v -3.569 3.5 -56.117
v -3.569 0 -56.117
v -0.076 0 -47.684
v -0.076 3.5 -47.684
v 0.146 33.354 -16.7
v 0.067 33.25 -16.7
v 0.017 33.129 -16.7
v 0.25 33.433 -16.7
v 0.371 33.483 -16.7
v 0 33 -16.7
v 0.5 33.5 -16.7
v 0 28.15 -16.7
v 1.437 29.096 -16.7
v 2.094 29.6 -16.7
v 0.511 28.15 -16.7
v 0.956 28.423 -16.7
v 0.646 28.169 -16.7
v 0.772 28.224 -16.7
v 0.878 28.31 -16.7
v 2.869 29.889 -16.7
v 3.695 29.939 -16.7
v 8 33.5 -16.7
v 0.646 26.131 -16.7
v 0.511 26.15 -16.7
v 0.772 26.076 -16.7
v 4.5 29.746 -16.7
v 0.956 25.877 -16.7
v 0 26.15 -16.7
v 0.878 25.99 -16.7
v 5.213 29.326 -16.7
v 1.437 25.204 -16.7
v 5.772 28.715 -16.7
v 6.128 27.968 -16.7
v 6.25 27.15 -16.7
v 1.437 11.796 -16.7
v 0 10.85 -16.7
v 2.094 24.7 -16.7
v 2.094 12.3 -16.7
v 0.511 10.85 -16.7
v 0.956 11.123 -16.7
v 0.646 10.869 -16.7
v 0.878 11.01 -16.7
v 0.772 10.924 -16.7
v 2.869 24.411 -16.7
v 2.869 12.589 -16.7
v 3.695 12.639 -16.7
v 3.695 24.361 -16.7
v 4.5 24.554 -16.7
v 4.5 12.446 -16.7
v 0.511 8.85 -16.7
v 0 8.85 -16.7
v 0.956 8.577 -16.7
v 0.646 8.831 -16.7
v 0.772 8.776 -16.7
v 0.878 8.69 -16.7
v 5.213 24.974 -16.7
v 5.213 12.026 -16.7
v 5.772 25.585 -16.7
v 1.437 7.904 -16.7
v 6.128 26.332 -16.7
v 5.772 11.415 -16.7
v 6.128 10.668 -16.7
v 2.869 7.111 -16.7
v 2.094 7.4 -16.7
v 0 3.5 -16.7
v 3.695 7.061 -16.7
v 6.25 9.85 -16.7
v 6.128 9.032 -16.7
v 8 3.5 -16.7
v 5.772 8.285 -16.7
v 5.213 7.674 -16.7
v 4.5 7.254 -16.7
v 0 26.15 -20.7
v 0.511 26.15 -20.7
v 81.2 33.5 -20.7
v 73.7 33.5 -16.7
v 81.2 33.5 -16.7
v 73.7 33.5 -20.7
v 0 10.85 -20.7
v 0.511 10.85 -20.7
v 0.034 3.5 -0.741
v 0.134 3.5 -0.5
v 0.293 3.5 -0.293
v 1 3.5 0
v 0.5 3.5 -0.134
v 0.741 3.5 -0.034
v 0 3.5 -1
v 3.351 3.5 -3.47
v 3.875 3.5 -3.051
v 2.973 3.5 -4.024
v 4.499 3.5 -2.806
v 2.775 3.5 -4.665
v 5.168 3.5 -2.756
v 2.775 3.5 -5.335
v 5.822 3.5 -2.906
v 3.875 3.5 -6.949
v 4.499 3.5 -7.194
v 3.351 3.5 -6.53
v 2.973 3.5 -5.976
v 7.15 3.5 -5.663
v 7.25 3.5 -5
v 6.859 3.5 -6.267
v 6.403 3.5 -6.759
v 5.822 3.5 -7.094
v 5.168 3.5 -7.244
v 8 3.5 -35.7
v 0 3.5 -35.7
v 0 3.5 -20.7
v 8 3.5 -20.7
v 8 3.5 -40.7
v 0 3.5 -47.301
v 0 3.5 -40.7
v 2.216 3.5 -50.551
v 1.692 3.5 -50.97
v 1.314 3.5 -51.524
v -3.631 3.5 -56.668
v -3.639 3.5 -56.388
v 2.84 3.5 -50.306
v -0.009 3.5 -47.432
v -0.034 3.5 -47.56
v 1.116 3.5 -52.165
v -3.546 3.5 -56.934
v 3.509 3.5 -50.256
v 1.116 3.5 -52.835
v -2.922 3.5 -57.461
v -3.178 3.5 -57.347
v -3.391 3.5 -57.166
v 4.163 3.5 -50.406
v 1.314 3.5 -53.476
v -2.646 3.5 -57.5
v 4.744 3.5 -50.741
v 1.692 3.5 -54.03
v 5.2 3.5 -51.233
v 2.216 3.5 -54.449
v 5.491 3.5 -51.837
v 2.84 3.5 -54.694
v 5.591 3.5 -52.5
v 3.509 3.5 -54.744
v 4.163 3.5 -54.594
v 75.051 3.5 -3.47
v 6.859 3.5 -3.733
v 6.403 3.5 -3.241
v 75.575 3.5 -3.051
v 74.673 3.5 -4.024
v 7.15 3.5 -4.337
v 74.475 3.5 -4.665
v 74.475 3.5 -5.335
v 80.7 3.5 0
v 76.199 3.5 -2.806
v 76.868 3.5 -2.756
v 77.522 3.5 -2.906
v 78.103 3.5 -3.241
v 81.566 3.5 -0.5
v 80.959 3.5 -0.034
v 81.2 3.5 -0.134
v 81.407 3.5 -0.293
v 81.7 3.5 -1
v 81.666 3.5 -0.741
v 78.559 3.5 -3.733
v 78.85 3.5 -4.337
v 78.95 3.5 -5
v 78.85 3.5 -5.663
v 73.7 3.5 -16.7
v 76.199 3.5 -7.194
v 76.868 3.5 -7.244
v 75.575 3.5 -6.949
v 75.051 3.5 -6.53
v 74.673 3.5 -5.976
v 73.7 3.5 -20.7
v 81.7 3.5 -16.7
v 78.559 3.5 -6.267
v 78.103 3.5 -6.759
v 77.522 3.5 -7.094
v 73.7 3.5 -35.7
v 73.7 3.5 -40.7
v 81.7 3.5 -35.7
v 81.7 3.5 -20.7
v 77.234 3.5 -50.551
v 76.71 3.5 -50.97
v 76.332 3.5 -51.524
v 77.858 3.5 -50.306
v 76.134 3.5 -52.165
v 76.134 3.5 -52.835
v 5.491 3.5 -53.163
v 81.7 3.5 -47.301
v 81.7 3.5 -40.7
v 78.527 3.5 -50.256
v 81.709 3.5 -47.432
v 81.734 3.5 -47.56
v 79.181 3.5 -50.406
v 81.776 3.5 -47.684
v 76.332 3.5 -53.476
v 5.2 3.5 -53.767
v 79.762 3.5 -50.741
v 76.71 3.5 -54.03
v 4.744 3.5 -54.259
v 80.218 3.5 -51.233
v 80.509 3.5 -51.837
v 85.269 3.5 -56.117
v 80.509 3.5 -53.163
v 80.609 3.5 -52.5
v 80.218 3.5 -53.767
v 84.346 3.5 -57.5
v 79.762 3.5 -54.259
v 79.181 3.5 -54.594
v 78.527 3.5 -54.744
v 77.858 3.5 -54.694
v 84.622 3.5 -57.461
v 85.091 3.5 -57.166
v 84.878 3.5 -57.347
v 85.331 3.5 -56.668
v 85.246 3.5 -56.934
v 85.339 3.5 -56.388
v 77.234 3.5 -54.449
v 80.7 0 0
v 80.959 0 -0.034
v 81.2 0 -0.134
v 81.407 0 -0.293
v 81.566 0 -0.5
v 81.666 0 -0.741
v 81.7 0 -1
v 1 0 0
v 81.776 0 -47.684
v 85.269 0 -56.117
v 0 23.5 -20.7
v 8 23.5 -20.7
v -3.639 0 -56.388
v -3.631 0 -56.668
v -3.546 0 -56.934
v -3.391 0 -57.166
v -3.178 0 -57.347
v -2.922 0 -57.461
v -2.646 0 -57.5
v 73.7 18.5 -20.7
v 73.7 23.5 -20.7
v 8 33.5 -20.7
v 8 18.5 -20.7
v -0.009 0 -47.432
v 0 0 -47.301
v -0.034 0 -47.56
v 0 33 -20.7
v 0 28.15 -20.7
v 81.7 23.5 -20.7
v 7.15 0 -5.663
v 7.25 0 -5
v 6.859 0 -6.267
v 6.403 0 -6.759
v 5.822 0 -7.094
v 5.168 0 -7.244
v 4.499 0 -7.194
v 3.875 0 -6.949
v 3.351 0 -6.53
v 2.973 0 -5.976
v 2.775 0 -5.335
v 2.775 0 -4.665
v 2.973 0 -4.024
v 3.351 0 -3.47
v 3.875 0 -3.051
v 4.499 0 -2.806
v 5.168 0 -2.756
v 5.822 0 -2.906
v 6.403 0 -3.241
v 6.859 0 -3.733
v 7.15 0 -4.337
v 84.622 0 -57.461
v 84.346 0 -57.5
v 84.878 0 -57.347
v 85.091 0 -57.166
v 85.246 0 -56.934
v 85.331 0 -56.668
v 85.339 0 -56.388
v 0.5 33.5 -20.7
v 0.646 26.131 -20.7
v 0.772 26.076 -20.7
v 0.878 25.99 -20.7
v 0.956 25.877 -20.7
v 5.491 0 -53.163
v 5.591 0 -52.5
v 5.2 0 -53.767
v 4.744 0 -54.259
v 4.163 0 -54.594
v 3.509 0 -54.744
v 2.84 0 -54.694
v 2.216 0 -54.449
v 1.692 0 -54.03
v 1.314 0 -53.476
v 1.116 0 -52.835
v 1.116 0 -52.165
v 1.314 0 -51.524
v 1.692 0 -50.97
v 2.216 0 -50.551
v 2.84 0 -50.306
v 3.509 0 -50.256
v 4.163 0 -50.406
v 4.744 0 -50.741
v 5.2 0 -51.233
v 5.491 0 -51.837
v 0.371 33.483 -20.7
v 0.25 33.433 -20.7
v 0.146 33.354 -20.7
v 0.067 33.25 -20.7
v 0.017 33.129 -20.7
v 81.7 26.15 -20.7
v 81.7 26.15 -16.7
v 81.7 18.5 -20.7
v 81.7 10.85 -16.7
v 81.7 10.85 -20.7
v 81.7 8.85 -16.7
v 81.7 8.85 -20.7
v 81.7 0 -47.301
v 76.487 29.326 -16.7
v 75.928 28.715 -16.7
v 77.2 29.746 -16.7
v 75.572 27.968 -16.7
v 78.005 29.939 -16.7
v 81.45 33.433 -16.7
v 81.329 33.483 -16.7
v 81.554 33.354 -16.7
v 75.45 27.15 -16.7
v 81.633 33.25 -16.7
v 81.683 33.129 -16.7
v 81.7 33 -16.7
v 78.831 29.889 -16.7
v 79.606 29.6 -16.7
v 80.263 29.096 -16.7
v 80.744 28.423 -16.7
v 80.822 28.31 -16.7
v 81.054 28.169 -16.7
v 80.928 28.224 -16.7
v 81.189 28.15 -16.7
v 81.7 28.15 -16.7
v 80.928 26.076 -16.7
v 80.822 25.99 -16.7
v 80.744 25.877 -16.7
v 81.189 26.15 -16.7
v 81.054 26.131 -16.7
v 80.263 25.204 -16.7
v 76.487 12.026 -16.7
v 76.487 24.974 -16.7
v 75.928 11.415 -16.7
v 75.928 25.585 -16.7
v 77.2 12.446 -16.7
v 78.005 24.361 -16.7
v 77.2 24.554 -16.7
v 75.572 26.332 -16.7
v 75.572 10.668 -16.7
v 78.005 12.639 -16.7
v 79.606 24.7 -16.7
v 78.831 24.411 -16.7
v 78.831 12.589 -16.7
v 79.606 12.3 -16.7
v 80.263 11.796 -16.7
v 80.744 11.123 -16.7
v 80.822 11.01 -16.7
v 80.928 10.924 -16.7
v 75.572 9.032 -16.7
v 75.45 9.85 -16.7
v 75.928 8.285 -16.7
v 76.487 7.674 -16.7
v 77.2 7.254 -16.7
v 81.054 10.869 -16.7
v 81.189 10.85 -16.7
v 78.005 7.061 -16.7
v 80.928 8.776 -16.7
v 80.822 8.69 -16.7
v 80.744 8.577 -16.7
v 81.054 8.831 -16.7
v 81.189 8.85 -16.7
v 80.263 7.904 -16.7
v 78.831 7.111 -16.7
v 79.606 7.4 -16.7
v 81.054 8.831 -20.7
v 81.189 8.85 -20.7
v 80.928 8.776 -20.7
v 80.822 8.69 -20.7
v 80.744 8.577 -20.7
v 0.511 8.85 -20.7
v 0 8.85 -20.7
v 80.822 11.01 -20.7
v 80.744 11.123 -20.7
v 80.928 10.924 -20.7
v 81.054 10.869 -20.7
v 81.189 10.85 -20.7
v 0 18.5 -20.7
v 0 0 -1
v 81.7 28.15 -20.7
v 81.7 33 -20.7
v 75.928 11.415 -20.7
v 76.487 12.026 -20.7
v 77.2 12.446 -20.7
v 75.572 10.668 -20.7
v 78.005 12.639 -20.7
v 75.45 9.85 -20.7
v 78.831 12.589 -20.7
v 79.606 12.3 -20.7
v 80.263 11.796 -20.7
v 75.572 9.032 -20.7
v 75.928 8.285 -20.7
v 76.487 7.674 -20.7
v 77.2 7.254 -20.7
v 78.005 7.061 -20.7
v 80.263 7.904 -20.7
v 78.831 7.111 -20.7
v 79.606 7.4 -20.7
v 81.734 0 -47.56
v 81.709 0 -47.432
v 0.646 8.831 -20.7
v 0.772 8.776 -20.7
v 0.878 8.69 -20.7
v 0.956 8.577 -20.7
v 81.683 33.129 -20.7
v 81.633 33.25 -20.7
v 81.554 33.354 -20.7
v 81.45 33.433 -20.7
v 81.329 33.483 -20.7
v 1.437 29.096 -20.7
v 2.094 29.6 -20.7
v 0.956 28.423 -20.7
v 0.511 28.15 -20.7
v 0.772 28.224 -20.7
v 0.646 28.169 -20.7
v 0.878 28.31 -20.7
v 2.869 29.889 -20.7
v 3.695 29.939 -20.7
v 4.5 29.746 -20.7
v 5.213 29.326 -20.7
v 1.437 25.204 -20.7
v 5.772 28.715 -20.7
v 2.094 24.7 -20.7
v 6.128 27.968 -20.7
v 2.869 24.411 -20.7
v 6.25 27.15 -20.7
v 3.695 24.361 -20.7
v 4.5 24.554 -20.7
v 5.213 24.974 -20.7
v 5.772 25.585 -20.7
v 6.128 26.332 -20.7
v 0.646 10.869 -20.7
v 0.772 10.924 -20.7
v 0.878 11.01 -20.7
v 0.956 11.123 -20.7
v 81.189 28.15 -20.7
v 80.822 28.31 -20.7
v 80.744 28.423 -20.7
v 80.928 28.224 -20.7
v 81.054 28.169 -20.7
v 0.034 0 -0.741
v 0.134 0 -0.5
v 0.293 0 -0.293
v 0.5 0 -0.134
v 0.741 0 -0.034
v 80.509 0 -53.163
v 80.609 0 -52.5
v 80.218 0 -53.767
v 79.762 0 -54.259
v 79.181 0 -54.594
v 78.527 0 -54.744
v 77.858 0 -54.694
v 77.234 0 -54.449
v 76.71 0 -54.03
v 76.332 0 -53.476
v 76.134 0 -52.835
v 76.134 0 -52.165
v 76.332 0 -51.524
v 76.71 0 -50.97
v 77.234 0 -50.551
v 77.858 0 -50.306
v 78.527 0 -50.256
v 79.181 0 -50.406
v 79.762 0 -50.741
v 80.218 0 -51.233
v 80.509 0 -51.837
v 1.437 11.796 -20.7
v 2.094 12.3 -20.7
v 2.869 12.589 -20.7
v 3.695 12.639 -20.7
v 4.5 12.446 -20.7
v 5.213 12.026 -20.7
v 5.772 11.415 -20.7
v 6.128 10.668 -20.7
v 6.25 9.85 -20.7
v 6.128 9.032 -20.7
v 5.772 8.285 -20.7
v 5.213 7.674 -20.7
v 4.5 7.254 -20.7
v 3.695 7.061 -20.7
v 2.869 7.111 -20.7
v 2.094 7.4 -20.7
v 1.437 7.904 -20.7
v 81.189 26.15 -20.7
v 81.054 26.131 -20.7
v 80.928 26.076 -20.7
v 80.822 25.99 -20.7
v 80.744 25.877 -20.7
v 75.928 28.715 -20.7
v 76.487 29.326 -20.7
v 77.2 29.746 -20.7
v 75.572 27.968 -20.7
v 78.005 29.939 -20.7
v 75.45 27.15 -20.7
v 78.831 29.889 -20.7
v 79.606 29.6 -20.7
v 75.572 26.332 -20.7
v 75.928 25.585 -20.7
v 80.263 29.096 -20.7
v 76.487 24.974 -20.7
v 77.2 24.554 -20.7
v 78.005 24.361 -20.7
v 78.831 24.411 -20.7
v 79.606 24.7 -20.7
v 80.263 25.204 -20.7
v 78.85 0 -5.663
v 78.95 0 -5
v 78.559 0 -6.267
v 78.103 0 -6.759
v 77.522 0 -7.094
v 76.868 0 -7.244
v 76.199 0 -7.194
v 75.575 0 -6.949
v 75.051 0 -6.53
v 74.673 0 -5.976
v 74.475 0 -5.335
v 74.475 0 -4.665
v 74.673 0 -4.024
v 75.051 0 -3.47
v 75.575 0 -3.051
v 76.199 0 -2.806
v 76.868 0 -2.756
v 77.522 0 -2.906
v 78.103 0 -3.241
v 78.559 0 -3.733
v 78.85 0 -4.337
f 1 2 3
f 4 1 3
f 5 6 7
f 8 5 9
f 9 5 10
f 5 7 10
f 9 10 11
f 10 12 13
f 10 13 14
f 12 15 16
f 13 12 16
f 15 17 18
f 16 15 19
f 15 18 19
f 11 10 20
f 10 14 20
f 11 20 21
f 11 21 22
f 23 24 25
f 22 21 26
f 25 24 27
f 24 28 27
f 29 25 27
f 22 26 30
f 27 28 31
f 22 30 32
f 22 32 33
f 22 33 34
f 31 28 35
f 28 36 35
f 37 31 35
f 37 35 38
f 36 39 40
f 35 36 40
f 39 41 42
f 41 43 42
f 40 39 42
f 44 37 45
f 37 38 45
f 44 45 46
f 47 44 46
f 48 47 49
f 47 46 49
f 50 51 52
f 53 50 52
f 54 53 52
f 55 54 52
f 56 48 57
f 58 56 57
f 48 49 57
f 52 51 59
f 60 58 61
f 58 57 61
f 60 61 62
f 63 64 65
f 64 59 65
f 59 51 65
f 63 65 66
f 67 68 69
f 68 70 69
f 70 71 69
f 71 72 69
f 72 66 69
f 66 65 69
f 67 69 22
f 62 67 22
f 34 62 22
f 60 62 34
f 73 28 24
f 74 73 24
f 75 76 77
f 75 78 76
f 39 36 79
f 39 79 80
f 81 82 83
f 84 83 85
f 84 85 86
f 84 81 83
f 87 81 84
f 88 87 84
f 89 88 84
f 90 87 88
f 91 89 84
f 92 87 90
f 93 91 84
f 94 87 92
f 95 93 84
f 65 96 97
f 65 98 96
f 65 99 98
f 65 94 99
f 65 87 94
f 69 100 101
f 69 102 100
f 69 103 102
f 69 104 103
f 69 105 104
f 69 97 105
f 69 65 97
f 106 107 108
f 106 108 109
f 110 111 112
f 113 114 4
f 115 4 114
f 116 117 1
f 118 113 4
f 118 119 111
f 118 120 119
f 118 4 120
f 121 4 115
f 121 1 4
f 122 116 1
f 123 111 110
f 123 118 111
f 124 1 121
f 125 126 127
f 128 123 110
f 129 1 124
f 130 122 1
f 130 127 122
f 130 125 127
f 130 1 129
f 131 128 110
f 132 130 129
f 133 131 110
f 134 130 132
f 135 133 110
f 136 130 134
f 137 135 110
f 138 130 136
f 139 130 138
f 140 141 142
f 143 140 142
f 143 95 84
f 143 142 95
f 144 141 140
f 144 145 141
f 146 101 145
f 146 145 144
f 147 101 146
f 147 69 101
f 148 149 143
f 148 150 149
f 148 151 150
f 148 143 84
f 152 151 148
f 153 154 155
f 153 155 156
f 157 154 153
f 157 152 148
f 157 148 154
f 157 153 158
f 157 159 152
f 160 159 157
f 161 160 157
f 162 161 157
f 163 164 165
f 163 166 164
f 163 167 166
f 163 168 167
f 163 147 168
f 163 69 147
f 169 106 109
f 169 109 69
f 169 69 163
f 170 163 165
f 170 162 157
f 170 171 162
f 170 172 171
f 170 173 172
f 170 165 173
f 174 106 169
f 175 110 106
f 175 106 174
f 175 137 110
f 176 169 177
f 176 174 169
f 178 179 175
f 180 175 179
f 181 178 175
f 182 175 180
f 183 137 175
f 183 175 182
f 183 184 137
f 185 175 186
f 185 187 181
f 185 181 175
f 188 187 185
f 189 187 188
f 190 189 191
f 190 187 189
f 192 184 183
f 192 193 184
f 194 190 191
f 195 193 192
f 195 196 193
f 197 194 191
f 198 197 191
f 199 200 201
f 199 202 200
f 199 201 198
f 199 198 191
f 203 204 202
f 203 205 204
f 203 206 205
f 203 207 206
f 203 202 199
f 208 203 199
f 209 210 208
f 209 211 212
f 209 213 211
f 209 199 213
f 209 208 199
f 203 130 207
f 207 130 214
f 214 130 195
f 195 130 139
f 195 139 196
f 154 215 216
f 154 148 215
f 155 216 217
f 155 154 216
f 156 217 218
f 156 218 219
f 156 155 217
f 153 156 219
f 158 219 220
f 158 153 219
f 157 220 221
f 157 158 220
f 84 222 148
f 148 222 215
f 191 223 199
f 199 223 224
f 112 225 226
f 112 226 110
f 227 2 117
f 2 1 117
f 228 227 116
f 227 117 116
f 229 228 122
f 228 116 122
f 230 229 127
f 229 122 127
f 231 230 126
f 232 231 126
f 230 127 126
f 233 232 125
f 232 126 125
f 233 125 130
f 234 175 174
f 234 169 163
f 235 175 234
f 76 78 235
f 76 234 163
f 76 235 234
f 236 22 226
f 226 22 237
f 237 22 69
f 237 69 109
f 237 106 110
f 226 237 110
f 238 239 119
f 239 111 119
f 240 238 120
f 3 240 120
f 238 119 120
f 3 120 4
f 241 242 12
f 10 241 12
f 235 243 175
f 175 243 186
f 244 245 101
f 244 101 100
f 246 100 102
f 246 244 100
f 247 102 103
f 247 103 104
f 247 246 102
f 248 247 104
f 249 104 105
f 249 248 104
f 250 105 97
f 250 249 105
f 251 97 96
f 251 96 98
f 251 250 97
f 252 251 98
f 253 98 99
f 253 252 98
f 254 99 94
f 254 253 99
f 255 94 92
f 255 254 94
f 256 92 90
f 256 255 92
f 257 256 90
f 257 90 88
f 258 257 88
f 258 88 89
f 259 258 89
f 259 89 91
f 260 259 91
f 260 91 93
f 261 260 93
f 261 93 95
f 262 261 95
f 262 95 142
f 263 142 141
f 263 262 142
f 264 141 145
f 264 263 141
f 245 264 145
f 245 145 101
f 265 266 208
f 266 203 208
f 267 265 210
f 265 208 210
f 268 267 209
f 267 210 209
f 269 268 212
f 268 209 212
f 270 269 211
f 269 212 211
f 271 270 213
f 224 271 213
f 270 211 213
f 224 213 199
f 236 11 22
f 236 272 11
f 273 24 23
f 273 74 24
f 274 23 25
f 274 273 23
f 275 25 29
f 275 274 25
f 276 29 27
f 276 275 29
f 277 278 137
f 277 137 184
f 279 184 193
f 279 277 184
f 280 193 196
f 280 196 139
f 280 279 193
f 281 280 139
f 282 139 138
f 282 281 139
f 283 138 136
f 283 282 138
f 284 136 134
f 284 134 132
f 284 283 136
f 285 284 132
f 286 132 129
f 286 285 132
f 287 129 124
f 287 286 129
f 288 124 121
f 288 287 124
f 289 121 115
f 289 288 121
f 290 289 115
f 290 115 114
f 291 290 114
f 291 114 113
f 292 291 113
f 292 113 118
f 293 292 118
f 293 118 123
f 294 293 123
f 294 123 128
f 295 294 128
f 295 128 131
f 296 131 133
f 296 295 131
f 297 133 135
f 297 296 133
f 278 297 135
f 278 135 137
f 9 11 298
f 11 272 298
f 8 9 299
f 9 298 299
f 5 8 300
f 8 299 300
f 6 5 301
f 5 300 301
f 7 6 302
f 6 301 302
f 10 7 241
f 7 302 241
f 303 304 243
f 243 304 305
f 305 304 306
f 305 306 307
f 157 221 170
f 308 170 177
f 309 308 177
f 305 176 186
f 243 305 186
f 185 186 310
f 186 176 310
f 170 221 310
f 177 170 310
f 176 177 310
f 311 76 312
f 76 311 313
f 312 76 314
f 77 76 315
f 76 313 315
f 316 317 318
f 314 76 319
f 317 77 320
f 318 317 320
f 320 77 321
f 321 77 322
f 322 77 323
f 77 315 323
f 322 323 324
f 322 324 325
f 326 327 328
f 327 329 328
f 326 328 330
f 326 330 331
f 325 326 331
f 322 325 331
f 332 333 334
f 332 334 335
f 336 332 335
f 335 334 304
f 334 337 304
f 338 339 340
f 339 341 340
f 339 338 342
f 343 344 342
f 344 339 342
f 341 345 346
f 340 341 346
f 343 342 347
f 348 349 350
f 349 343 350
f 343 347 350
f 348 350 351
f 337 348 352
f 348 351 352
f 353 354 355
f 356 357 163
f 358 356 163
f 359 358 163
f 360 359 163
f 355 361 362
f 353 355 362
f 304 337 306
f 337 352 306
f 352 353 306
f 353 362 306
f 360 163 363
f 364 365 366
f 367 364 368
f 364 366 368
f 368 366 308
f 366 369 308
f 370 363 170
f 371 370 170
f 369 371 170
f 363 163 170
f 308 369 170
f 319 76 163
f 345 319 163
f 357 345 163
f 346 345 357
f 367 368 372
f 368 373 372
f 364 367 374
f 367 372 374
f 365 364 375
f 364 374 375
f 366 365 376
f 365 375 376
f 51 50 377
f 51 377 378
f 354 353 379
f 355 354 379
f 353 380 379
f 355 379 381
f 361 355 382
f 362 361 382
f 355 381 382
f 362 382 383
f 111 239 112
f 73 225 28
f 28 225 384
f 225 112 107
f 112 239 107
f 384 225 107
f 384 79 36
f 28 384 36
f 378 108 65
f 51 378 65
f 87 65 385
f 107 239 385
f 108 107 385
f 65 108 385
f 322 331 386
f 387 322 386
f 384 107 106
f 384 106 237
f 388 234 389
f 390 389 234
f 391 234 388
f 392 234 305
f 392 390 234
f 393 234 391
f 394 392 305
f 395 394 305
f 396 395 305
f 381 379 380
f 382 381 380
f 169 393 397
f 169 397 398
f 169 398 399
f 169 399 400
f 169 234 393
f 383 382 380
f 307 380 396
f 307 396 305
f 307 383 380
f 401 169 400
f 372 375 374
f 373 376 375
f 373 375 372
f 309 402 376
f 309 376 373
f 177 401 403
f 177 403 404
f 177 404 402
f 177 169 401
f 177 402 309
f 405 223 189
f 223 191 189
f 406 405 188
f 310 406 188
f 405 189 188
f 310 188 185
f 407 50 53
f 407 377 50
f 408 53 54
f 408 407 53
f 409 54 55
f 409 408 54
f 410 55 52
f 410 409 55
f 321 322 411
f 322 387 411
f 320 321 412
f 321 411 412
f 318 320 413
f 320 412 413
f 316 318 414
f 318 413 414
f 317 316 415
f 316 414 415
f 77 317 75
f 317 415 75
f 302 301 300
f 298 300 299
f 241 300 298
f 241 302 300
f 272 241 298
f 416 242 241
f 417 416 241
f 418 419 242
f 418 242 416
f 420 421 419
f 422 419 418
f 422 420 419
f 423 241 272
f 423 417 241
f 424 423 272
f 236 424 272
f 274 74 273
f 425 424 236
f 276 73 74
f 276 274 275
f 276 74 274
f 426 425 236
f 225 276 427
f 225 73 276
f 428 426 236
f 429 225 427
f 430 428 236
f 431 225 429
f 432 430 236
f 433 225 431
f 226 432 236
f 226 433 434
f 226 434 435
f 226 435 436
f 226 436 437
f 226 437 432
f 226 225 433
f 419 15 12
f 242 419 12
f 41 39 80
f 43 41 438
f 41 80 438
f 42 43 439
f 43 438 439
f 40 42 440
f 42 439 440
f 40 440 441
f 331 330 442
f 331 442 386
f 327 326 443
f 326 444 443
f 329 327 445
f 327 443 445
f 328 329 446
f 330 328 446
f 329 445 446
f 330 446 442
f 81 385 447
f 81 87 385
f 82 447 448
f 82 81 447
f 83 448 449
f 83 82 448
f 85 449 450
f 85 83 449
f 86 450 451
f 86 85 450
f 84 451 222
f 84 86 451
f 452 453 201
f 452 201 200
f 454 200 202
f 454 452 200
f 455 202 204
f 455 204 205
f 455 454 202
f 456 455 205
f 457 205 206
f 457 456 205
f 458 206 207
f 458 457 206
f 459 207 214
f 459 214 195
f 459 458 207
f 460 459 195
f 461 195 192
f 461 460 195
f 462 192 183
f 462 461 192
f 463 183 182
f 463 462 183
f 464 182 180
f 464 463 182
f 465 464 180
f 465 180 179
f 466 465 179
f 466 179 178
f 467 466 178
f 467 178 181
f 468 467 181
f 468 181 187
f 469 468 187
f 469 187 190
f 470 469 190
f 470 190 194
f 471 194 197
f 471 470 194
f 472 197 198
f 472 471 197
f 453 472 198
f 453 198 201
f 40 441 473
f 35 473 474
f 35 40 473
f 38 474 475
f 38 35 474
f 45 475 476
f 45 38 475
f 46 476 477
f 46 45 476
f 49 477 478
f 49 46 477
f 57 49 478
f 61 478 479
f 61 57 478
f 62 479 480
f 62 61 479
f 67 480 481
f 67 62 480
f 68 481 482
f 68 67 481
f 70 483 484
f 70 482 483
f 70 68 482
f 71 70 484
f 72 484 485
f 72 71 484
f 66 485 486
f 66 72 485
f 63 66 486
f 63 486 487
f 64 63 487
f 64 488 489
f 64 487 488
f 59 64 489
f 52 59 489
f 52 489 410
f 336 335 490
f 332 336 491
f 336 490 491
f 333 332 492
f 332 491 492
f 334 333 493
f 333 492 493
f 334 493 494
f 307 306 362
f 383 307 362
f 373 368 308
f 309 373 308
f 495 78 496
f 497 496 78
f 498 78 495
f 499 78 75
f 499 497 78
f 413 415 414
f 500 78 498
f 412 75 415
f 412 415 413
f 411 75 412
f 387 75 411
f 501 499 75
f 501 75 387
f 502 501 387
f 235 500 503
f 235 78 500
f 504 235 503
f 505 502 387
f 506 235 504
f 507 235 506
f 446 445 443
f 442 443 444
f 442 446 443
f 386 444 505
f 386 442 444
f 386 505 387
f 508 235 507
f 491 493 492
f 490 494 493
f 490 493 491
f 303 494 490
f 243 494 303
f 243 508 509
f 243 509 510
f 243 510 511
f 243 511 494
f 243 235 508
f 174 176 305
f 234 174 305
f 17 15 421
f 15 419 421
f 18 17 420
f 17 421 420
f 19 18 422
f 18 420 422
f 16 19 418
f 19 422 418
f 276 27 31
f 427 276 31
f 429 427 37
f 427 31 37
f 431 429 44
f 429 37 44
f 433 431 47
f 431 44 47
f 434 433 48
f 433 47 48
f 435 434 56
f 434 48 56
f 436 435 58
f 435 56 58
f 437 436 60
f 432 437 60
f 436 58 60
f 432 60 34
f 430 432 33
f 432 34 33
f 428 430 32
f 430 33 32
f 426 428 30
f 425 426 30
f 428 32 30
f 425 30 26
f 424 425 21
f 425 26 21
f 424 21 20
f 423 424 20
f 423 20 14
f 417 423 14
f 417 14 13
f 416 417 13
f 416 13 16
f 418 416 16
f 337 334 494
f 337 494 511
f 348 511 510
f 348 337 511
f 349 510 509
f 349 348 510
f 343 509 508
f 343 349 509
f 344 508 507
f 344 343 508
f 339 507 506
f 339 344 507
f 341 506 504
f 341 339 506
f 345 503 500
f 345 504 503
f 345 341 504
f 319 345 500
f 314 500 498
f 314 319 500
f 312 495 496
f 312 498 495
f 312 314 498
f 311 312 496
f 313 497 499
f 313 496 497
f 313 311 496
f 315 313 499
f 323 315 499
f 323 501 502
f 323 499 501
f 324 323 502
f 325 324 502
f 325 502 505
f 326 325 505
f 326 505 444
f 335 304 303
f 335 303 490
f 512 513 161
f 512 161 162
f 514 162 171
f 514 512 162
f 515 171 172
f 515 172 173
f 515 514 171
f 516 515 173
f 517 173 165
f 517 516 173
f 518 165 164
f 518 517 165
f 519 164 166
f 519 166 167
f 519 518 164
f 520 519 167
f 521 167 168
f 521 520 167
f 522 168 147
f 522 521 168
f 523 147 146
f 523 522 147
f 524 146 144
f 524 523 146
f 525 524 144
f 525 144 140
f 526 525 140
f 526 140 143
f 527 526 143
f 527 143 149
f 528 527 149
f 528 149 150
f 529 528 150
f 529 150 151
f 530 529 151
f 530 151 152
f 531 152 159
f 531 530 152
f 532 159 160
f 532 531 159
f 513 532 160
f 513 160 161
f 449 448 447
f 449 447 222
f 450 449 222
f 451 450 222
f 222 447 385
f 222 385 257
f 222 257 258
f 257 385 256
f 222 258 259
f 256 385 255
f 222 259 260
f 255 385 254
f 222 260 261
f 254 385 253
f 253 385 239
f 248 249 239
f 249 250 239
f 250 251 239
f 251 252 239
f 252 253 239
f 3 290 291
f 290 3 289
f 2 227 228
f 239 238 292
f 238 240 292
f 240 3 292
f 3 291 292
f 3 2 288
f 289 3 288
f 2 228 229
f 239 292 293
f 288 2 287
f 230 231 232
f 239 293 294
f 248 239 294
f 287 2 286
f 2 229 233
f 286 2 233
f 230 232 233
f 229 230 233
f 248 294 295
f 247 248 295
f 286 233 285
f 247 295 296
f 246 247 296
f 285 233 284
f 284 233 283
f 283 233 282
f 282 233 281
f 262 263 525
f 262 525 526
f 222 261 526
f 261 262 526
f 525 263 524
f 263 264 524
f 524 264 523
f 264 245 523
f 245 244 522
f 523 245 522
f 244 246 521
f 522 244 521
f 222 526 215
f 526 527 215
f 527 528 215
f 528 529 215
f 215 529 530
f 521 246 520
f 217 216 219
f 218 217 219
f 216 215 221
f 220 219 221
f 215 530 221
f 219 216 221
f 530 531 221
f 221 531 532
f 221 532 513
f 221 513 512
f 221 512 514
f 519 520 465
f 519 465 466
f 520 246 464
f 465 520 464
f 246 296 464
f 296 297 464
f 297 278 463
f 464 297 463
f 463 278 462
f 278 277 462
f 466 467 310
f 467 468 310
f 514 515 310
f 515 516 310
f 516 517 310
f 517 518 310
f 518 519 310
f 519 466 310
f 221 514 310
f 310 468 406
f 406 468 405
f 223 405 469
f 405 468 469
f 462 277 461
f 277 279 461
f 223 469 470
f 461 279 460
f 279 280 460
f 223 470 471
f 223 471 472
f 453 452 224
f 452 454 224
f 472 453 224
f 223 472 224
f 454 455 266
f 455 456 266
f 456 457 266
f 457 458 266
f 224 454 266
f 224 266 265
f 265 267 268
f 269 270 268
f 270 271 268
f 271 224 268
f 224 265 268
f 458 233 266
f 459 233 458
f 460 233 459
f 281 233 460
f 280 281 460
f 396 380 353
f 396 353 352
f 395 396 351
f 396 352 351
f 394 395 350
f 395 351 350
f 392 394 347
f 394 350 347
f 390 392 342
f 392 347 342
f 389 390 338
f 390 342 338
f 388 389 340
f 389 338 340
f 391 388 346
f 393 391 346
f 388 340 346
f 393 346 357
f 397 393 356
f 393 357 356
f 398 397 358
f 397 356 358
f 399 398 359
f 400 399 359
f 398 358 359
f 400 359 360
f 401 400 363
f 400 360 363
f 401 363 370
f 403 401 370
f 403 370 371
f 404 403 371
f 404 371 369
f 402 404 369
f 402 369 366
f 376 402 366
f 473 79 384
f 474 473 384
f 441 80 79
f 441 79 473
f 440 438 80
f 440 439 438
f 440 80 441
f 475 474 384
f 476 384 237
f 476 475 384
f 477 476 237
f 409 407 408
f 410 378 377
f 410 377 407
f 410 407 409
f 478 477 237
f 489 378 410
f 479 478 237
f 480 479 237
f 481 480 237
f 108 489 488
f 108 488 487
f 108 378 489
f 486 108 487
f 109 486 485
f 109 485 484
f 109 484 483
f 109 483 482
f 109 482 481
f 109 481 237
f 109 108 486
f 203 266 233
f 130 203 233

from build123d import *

# Parameters (mm, degrees)
SKETCH1_R           = 2.25
BOSS_EXTRUDE1_DEPTH = 3.5
SKETCH2_W           = 8
SKETCH2_H           = 4
BOSS_EXTRUDE2_DEPTH = 30
CUT_EXTRUDE1_DEPTH  = 41.8
BOSS_EXTRUDE3_DEPTH = 8
FILLET3_R           = 0.5
FILLET4_R           = 1


with BuildPart() as part:
    # Sketch1 → Boss-Extrude1 (new body)
    with BuildSketch(Plane(origin=(0, 0, 0), x_dir=(1, 0, 0), z_dir=(0, 1, 0))):
        Polygon((0, 0), (81.7, 0), (81.7, 47.5), (85.842135624, 57.5), (81.7, 57.5), (0, 57.5), (-4.142135624, 57.5), (0, 47.5), align=None)
        with Locations((5, 5)):
            Circle(SKETCH1_R, mode=Mode.SUBTRACT)
        with Locations((76.7, 5)):
            Circle(SKETCH1_R, mode=Mode.SUBTRACT)
        with Locations((3.34089319, 52.5)):
            Circle(SKETCH1_R, mode=Mode.SUBTRACT)
        with Locations((78.35910681, 52.5)):
            Circle(SKETCH1_R, mode=Mode.SUBTRACT)
    extrude(amount=BOSS_EXTRUDE1_DEPTH)

    # Sketch2 → Boss-Extrude2 (add)
    with BuildSketch(Plane(origin=(0, 3.5, 0), x_dir=(1, 0, 0), z_dir=(0, 1, 0))):
        with Locations((4, 18.7)):
            Rectangle(SKETCH2_W, SKETCH2_H)
        with Locations((77.7, 18.7)):
            Rectangle(SKETCH2_W, SKETCH2_H)
    extrude(amount=BOSS_EXTRUDE2_DEPTH)

    # Sketch3 → Cut-Extrude1 (cut, through all)
    with BuildSketch(Plane.XY.offset(-16.7)):
        with BuildLine():
            Line((0.834660634, 28.15), (0, 28.15))
            Line((0, 28.15), (0, 26.15))
            Line((0, 26.15), (0.834660634, 26.15))
            ThreePointArc((0.834660634, 26.15), (6.25, 27.15), (0.834660634, 28.15))
        make_face()
        with BuildLine():
            Line((0, 10.85), (0.834660634, 10.85))
            ThreePointArc((0.834660634, 10.85), (6.25, 9.85), (0.834660634, 8.85))
            Line((0.834660634, 8.85), (0, 8.85))
            Line((0, 8.85), (0, 10.85))
        make_face()
        with BuildLine():
            Line((81.7, 8.85), (81.7, 10.85))
            Line((81.7, 10.85), (80.865339366, 10.85))
            ThreePointArc((80.865339366, 10.85), (75.45, 9.85), (80.865339366, 8.85))
            Line((80.865339366, 8.85), (81.7, 8.85))
        make_face()
        with BuildLine():
            Line((81.7, 26.15), (80.865339366, 26.15))
            ThreePointArc((80.865339366, 26.15), (75.45, 27.15), (80.865339366, 28.15))
            Line((80.865339366, 28.15), (81.7, 28.15))
            Line((81.7, 28.15), (81.7, 26.15))
        make_face()
    extrude(amount=-CUT_EXTRUDE1_DEPTH, mode=Mode.SUBTRACT)

    # Sketch4 → Boss-Extrude3 (add)
    with BuildSketch(Plane(origin=(0, 0, 0), x_dir=(0, 0, -1), z_dir=(1, 0, 0))):
        Polygon((20.7, 23.5), (40.7, 3.5), (35.7, 3.5), (20.7, 18.5), align=None)
    boss_extrude3 = extrude(amount=BOSS_EXTRUDE3_DEPTH)

    # Mirror1: Boss-Extrude3 across plane
    add(boss_extrude3.mirror(Plane(origin=(40.85, 0, 0), x_dir=(0, 0, 1), z_dir=(1, 0, 0))))

    # Fillet3
    fillet3_edges = [part.edges().sort_by_distance(p)[0] for p in [
        (80.865339366, 26.15, -18.7),
        (80.865339366, 28.15, -18.7),
        (0.834660634, 10.85, -18.7),
        (0.834660634, 8.85, -18.7),
        (0, 33.5, -18.7),
        (81.7, 33.5, -18.7),
        (0.834660634, 28.15, -18.7),
        (0.834660634, 26.15, -18.7),
        (80.865339366, 8.85, -18.7),
        (80.865339366, 10.85, -18.7),
    ]]
    fillet(fillet3_edges, radius=FILLET3_R)

    # Fillet4
    fillet4_edges = [part.edges().sort_by_distance(p)[0] for p in [
        (0, 1.75, -47.5),
        (-4.142135624, 1.75, -57.5),
        (85.842135624, 1.75, -57.5),
        (81.7, 1.75, -47.5),
        (81.7, 1.75, 0),
        (0, 1.75, 0),
    ]]
    fillet(fillet4_edges, radius=FILLET4_R)


solid = part.part
